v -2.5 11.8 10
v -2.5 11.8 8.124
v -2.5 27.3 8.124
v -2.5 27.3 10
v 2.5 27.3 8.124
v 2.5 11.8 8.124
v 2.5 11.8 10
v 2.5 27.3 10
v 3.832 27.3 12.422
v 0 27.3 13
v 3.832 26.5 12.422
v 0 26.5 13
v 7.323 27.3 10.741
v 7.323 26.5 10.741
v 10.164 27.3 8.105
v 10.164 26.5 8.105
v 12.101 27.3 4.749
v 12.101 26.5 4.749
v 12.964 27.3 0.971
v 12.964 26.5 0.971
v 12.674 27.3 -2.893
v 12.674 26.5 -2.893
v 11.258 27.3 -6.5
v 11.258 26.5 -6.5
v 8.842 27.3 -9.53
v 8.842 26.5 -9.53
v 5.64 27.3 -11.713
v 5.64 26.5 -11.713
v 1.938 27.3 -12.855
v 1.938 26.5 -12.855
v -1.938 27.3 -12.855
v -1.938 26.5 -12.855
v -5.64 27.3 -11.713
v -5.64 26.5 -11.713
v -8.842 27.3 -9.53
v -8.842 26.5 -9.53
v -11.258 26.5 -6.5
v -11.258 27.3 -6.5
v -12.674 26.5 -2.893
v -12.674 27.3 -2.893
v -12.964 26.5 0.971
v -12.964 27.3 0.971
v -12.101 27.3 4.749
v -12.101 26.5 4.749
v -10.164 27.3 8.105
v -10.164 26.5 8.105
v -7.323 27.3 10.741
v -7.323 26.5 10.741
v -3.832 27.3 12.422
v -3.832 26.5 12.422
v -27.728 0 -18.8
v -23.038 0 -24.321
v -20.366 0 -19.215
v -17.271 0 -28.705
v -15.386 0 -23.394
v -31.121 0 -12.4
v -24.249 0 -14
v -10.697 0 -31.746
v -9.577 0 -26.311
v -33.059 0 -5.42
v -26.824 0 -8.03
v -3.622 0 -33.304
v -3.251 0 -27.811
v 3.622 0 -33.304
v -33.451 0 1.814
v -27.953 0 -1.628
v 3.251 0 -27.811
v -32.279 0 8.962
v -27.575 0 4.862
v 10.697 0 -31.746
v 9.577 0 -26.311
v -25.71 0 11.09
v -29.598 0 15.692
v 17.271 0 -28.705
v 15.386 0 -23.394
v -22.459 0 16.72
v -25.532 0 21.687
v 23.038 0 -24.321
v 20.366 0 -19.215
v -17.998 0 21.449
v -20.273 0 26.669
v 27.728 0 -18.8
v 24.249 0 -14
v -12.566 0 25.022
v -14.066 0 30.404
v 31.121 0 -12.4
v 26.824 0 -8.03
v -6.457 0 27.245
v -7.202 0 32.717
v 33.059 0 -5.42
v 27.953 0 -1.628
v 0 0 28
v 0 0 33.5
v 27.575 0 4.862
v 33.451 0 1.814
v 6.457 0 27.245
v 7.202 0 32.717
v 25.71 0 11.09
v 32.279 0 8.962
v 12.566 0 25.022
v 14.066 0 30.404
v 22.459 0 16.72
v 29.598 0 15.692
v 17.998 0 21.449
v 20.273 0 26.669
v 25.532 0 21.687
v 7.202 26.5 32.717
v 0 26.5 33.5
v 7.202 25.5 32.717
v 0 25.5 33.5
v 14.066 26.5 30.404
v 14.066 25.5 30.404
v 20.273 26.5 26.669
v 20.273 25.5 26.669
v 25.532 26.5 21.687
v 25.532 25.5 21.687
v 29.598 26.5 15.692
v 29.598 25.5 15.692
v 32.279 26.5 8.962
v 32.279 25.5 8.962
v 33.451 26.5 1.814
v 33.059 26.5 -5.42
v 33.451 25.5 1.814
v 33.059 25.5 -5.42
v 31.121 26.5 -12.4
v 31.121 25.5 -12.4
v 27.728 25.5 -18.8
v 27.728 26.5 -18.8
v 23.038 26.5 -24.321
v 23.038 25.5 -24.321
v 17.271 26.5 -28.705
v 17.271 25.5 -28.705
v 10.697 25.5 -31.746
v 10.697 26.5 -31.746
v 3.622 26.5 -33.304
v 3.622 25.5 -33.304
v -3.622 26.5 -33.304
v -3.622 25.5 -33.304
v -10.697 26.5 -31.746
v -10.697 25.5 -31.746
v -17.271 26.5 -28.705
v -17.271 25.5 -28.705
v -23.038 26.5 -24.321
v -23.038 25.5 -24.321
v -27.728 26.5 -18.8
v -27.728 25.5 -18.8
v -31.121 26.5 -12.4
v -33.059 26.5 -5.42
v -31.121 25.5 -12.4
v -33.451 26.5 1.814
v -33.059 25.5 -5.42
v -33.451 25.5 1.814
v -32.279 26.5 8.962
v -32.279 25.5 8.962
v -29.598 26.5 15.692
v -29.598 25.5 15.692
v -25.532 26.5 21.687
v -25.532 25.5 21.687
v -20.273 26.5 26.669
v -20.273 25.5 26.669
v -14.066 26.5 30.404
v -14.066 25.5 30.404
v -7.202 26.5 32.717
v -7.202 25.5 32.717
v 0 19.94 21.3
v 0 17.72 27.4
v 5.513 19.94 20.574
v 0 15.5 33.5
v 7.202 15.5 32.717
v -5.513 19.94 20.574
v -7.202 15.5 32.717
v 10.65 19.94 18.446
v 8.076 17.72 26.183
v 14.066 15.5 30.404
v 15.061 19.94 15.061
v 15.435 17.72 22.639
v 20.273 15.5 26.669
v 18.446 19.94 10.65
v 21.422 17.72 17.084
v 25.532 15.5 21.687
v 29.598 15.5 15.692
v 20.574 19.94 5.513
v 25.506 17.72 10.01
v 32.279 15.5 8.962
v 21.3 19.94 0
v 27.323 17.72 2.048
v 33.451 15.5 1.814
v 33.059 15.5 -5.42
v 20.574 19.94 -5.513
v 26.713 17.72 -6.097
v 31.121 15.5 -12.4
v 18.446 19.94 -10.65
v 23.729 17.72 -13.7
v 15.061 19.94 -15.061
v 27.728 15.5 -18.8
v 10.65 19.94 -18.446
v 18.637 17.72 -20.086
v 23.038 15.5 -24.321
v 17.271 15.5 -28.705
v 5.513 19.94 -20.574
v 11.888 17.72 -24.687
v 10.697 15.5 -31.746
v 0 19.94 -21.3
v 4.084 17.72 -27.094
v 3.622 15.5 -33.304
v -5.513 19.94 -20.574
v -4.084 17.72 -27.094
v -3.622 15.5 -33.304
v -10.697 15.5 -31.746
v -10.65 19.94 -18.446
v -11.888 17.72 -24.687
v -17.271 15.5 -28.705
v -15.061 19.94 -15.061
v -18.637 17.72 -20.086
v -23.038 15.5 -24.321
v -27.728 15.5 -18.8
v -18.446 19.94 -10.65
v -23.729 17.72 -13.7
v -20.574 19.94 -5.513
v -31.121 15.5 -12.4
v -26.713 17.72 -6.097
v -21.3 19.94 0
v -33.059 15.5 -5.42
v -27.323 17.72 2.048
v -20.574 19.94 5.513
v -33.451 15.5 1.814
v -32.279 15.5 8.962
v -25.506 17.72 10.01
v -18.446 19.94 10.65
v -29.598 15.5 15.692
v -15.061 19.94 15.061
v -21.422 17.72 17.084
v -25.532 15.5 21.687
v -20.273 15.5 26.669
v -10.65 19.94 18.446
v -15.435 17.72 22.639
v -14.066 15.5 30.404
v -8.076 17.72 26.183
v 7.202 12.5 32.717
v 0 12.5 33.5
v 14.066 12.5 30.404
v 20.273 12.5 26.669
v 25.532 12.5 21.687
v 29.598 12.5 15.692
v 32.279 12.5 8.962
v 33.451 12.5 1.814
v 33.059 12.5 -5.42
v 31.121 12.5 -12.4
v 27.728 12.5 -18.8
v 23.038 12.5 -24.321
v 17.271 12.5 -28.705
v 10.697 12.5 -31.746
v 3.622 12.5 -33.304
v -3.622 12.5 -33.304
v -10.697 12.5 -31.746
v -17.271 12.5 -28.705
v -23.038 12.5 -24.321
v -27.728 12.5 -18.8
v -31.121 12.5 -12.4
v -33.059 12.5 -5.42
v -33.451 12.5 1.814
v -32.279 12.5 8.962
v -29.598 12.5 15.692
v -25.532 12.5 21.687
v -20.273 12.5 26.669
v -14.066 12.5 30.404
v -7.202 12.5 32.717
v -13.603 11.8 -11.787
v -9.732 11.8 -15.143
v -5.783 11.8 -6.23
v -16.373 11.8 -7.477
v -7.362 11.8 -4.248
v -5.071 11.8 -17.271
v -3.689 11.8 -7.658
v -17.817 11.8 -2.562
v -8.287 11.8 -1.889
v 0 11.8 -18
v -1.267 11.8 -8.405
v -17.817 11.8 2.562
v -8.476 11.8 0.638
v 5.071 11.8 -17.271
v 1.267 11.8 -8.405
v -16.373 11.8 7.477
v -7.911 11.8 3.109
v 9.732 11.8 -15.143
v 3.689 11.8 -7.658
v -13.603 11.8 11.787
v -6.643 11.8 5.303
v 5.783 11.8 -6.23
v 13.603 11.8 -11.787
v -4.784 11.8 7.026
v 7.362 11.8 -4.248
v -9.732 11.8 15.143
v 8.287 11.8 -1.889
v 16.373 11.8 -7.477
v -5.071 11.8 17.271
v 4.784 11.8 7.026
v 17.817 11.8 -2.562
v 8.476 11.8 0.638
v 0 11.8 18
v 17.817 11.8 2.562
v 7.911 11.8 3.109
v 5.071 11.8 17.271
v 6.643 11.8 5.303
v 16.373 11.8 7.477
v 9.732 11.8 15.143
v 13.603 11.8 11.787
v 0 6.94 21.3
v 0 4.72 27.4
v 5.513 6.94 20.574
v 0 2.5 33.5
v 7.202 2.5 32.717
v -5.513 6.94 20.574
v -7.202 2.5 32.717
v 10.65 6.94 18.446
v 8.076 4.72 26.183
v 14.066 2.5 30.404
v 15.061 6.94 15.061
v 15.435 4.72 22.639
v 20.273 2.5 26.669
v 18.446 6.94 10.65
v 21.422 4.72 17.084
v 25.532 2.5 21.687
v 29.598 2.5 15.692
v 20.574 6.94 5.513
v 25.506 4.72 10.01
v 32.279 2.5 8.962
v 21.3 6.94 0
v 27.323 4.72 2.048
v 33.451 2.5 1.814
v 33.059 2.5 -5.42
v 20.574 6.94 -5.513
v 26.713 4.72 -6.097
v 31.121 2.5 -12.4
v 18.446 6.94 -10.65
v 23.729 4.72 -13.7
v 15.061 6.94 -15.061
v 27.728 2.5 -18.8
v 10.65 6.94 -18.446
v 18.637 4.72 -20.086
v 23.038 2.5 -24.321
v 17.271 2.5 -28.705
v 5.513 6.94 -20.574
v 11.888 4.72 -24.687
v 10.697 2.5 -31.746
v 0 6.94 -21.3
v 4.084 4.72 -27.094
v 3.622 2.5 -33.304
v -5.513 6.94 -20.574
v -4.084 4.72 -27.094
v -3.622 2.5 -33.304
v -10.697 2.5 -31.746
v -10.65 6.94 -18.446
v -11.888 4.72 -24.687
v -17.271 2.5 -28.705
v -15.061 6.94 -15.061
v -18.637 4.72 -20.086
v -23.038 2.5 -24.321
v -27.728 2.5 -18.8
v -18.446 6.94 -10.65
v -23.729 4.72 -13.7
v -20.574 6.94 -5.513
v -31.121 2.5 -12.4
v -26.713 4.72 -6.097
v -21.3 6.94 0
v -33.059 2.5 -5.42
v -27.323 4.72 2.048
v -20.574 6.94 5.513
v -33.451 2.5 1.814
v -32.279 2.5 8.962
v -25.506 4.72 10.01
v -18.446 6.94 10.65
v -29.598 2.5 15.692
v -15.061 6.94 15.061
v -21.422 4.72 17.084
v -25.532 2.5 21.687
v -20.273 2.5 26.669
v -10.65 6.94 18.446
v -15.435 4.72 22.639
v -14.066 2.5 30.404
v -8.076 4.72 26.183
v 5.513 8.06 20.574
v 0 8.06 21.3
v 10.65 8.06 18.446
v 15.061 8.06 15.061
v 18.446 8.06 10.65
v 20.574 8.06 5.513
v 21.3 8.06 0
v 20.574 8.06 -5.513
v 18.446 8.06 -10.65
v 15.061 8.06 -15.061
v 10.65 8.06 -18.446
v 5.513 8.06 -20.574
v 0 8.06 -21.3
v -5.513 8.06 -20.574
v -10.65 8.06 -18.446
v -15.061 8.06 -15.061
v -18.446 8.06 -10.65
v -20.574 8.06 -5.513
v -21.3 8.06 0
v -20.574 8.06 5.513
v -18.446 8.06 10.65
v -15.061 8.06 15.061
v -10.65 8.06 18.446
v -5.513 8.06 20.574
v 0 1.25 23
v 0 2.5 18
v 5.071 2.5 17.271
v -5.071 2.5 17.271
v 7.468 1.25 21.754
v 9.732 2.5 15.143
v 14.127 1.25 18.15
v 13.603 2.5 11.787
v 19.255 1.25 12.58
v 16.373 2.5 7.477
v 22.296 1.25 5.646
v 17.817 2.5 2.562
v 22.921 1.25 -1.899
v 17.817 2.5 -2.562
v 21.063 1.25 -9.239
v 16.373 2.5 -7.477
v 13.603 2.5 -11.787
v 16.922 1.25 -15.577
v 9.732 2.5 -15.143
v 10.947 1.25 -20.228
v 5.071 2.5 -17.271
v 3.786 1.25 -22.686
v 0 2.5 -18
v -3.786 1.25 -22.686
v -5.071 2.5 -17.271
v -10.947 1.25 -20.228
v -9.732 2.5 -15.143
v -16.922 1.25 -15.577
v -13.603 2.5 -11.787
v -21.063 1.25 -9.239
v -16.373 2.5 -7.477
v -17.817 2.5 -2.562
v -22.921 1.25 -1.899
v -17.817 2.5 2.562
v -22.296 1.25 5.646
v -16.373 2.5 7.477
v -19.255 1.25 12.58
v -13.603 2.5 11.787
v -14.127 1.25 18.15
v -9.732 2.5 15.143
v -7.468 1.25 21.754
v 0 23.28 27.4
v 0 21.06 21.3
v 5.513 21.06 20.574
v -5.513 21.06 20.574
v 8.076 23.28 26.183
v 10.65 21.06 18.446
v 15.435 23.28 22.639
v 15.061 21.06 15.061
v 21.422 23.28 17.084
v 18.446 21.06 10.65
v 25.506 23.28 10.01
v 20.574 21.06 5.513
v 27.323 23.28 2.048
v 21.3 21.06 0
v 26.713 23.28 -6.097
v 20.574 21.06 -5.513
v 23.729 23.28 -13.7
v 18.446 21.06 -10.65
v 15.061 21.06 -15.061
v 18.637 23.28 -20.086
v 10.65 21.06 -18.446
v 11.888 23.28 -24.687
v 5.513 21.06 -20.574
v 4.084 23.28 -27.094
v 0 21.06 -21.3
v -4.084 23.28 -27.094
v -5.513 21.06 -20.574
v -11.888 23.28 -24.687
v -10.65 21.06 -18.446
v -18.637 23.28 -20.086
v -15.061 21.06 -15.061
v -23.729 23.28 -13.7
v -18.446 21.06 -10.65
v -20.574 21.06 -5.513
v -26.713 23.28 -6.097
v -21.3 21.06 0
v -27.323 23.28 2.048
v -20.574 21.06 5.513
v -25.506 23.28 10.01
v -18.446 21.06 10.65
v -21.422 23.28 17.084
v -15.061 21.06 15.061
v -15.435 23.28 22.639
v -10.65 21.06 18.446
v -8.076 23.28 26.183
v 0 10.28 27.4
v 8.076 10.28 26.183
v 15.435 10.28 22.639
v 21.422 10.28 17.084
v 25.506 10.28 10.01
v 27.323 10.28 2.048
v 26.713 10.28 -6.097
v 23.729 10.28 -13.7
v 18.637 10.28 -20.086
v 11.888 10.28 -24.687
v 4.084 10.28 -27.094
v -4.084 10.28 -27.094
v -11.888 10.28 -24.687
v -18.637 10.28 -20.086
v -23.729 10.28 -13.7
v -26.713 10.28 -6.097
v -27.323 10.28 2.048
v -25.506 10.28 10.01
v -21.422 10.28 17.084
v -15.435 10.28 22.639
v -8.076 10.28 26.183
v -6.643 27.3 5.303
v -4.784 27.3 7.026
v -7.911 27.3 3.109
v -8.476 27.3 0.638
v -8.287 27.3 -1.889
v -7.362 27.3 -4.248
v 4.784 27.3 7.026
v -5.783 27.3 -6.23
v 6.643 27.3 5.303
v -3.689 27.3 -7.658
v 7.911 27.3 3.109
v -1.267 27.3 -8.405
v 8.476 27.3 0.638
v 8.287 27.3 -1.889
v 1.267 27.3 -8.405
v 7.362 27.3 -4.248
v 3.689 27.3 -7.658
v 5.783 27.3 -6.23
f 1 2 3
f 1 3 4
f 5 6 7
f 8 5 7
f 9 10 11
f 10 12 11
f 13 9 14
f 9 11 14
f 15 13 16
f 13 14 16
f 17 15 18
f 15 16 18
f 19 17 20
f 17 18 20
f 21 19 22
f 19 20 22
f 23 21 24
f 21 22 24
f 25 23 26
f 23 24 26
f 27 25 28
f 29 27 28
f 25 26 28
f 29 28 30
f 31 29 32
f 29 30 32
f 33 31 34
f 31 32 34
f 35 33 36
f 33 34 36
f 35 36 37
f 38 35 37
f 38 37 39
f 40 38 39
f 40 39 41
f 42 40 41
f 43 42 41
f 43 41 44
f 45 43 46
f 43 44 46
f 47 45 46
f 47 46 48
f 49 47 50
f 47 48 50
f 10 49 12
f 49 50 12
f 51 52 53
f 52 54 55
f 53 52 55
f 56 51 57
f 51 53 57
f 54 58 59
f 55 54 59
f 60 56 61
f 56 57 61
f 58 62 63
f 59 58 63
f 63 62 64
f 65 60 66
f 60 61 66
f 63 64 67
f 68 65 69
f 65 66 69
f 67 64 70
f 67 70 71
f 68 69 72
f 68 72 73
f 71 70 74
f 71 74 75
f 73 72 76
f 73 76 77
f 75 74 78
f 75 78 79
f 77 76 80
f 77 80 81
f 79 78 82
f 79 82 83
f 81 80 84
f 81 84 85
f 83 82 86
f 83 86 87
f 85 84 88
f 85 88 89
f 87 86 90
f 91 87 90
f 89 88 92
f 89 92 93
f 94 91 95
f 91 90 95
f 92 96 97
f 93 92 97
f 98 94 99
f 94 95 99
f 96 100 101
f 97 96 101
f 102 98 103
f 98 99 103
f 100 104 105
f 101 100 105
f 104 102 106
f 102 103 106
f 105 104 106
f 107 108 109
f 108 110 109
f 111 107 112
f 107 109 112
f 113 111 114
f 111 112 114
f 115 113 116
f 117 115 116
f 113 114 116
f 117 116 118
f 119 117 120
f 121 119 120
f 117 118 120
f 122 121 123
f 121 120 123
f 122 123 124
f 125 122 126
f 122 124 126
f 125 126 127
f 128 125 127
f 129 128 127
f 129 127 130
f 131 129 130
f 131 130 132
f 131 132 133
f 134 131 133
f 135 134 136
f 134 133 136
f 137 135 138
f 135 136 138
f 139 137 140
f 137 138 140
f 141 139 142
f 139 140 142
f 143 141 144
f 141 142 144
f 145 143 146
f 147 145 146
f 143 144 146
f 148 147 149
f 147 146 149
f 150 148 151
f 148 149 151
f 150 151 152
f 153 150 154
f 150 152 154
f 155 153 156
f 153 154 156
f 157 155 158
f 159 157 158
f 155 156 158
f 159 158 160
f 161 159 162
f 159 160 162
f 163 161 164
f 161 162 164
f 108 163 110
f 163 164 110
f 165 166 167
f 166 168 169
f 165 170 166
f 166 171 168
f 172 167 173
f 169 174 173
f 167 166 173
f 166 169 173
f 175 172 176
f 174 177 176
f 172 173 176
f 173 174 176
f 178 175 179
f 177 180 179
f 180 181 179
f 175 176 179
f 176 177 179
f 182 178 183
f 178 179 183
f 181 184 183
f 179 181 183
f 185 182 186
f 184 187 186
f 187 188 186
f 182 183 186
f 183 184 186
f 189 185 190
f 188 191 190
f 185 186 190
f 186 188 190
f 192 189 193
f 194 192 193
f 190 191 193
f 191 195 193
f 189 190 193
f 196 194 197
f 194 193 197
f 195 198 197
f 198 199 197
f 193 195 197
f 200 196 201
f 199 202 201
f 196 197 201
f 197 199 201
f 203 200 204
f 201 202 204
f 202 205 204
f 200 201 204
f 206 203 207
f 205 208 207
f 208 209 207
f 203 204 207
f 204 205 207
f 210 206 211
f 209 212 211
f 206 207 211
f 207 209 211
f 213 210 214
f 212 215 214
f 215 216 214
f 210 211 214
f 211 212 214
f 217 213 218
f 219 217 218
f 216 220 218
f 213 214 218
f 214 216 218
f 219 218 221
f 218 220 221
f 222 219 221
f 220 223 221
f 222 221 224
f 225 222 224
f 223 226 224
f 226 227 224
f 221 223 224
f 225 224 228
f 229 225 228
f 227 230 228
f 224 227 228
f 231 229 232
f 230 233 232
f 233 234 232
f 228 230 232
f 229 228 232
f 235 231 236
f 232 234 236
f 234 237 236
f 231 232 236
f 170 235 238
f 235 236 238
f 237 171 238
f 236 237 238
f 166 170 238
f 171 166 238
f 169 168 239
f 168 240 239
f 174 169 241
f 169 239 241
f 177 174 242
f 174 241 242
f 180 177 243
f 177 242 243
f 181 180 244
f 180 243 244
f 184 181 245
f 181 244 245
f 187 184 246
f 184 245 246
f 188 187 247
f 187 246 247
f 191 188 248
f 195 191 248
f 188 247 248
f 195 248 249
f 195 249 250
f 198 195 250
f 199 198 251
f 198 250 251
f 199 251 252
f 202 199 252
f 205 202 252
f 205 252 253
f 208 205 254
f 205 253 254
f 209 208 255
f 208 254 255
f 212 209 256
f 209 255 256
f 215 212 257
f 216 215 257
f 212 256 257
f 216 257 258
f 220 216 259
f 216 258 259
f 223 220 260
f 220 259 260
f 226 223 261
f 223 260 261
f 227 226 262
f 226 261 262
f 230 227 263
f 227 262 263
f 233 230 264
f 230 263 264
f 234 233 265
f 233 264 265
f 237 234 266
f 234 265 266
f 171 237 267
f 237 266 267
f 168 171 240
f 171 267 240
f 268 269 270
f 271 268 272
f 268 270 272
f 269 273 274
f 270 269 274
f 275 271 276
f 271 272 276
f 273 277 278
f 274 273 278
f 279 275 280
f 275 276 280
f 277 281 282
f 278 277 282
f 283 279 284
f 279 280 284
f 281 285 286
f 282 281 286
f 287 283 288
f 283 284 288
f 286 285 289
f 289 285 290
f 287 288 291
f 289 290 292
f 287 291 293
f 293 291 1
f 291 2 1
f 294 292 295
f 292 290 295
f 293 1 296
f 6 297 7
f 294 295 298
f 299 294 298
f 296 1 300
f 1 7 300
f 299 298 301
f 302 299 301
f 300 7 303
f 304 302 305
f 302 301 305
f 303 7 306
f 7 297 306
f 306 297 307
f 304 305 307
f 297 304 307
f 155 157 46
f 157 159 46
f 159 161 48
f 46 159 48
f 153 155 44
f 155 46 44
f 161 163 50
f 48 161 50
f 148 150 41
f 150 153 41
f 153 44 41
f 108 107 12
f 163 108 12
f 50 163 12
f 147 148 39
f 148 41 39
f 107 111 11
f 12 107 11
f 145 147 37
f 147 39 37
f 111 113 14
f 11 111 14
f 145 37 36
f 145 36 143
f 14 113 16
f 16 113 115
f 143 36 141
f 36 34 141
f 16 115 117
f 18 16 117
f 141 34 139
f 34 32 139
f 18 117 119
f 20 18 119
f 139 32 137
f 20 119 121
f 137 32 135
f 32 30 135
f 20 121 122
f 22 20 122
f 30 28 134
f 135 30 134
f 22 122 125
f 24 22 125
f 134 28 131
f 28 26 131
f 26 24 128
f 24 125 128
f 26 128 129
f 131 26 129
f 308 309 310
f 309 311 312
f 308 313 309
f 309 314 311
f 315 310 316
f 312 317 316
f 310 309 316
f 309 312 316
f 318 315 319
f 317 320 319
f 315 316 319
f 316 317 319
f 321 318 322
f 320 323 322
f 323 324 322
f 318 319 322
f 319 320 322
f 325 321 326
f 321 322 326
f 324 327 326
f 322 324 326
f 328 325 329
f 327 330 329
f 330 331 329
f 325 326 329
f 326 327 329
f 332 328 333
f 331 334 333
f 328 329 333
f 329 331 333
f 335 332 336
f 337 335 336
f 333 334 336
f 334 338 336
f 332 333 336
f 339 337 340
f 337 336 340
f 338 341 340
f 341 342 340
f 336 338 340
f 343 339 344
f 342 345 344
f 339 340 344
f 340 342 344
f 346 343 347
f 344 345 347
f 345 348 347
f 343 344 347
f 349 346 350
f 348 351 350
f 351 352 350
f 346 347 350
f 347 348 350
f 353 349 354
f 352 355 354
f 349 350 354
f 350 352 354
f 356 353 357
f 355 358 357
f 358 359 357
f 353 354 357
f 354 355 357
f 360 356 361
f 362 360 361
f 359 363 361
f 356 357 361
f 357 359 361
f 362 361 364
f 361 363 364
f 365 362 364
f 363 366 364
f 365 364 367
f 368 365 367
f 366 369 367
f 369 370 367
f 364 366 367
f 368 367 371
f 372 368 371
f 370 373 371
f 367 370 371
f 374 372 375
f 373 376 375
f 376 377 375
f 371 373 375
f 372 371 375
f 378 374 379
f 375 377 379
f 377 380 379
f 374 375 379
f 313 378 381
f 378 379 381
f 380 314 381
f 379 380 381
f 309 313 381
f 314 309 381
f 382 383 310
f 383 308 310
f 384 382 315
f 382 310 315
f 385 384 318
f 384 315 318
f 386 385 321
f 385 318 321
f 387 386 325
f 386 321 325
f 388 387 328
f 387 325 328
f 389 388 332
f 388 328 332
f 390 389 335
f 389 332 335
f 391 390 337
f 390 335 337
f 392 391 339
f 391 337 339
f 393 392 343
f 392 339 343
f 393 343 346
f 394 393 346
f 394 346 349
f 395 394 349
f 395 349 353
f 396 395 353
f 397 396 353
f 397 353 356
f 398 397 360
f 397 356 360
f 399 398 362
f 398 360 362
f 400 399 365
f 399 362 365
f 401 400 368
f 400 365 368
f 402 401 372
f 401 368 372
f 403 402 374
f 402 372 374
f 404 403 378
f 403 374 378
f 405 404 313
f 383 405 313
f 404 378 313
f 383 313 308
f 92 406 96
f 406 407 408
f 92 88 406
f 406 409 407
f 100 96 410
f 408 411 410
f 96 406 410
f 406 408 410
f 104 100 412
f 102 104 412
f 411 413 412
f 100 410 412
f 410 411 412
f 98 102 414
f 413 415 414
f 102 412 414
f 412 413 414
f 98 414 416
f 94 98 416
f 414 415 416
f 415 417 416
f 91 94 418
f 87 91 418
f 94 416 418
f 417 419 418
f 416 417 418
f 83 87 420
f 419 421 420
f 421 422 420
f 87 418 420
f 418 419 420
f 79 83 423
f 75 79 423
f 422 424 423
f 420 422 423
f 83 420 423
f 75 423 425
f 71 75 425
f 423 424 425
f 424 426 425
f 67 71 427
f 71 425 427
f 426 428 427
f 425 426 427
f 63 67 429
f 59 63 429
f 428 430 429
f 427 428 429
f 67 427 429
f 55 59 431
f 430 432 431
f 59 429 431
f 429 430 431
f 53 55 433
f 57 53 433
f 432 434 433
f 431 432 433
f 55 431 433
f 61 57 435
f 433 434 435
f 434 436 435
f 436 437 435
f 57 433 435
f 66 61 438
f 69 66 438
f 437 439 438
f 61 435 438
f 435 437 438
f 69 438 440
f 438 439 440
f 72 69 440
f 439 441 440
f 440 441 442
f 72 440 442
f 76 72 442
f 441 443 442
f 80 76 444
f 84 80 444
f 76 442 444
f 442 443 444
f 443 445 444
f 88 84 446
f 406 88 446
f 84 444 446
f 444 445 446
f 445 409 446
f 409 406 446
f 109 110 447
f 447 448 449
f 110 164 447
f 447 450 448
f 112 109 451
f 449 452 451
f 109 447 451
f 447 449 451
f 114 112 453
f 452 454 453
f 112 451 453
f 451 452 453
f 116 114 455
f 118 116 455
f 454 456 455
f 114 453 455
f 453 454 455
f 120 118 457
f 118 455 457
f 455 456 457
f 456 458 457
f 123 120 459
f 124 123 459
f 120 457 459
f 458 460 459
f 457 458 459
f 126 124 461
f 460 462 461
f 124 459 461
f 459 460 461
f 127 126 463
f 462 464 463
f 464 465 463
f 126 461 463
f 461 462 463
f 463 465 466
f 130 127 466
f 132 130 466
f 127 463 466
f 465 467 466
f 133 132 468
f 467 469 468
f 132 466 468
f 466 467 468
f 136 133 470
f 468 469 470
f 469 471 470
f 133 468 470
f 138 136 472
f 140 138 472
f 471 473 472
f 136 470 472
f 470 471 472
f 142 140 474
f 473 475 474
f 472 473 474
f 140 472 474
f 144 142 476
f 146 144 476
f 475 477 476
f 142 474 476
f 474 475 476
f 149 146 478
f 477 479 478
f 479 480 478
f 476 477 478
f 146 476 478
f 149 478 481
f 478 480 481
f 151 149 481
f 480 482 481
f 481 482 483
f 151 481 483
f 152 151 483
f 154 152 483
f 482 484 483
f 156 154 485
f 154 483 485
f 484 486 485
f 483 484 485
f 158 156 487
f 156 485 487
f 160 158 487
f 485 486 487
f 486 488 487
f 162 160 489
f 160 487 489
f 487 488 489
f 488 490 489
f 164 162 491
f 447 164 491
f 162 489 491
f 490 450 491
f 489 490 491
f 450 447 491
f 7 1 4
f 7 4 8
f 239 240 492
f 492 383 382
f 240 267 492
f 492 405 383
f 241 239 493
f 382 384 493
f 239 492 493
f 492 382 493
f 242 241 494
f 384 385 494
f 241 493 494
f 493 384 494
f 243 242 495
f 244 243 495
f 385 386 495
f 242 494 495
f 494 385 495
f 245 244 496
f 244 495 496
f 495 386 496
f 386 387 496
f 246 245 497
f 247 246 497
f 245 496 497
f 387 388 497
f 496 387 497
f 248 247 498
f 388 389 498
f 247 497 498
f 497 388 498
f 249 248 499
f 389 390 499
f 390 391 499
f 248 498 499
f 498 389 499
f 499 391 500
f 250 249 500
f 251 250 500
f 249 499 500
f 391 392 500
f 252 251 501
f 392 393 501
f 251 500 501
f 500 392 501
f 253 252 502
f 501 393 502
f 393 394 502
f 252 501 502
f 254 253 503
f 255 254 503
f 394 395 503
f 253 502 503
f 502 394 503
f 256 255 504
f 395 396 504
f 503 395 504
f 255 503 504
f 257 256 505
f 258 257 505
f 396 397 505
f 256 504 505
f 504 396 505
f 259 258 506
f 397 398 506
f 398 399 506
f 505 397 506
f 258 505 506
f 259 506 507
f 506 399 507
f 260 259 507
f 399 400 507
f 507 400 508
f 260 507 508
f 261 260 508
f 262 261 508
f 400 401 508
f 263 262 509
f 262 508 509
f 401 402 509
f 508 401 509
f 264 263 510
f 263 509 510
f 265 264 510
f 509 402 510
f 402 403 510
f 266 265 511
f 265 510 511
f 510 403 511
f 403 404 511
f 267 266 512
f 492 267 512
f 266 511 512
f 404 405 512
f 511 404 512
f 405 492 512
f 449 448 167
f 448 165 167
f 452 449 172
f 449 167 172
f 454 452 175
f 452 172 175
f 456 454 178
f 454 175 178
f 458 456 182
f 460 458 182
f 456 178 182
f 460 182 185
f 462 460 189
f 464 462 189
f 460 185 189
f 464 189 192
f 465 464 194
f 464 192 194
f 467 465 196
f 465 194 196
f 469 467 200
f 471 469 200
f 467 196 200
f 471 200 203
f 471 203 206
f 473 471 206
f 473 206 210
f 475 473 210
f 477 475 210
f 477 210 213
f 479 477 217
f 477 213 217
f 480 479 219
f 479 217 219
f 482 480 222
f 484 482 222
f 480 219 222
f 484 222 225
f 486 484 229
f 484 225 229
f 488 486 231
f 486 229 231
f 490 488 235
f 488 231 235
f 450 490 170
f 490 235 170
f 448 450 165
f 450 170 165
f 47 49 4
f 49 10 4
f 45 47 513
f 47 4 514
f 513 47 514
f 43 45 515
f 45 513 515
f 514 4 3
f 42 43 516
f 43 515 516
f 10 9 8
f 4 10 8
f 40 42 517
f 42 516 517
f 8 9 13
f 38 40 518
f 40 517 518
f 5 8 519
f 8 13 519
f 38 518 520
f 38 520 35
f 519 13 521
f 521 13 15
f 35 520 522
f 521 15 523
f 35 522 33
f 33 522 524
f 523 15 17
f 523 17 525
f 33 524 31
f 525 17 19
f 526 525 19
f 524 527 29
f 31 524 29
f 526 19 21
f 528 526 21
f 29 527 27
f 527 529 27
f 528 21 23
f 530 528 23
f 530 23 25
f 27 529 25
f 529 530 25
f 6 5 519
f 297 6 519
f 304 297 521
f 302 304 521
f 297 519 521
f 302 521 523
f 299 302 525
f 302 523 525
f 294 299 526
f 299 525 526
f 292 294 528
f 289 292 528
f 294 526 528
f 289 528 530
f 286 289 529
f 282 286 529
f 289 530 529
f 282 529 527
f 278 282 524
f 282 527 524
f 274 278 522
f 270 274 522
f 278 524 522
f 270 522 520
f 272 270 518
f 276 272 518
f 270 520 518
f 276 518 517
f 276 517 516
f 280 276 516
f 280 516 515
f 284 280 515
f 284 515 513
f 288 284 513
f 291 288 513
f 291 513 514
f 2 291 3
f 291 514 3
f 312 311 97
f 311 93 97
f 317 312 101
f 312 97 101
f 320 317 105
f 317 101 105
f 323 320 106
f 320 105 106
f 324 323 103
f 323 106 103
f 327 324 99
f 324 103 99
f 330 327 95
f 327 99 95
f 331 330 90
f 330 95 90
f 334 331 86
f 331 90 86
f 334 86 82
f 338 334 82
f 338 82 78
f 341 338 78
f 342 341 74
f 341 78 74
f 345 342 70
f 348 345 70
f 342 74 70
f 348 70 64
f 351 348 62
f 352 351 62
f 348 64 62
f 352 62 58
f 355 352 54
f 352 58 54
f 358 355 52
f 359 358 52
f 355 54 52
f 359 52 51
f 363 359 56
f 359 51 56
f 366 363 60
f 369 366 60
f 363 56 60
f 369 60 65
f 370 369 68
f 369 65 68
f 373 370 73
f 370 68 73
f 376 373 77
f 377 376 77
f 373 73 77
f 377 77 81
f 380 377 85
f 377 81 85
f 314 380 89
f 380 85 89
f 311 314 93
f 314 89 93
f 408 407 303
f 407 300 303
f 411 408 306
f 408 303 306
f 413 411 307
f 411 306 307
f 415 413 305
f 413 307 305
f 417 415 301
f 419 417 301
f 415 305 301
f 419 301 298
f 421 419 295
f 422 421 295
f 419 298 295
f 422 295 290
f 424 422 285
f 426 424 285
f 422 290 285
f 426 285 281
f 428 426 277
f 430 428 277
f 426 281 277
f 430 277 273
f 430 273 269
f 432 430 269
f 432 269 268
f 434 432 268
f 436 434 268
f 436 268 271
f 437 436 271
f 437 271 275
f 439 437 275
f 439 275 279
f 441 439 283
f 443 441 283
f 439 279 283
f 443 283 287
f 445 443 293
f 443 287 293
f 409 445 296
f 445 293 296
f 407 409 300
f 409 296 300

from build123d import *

# Parameters (mm, degrees)
F2_W     = 5
F2_H     = 3
F3_DEPTH = 27.301


# Not quite as in the source:
# - ends of sketch curves that miss each other by under 0.0002 mm in the source are joined


with BuildPart() as f1:
    # F0 (on Right) → F1 (revolve)
    with BuildSketch(Plane.YZ):
        Polygon((2.5, 33.5), (0, 33.5), (0, 28), (2.5, 18), (11.8, 18), (11.8, 8.5), (27.3, 8.5), (27.3, 13), (26.5, 13), (26.5, 33.5), (25.5, 33.5), (21.0595629684, 21.3), (19.940437, 21.3), (15.5, 33.5), (12.5, 33.5), (8.0595629684, 21.3), (6.940437, 21.3), align=None)
    revolve(axis=Axis((0, 13.65, 0), (0, 1, 0)))

    # F2 (on Front) → F3 (cut, through all)
    with BuildSketch(Plane.XZ):
        with Locations((0, 8.5)):
            Rectangle(F2_W, F2_H)
    extrude(amount=-F3_DEPTH, mode=Mode.SUBTRACT)


solid = f1.part
